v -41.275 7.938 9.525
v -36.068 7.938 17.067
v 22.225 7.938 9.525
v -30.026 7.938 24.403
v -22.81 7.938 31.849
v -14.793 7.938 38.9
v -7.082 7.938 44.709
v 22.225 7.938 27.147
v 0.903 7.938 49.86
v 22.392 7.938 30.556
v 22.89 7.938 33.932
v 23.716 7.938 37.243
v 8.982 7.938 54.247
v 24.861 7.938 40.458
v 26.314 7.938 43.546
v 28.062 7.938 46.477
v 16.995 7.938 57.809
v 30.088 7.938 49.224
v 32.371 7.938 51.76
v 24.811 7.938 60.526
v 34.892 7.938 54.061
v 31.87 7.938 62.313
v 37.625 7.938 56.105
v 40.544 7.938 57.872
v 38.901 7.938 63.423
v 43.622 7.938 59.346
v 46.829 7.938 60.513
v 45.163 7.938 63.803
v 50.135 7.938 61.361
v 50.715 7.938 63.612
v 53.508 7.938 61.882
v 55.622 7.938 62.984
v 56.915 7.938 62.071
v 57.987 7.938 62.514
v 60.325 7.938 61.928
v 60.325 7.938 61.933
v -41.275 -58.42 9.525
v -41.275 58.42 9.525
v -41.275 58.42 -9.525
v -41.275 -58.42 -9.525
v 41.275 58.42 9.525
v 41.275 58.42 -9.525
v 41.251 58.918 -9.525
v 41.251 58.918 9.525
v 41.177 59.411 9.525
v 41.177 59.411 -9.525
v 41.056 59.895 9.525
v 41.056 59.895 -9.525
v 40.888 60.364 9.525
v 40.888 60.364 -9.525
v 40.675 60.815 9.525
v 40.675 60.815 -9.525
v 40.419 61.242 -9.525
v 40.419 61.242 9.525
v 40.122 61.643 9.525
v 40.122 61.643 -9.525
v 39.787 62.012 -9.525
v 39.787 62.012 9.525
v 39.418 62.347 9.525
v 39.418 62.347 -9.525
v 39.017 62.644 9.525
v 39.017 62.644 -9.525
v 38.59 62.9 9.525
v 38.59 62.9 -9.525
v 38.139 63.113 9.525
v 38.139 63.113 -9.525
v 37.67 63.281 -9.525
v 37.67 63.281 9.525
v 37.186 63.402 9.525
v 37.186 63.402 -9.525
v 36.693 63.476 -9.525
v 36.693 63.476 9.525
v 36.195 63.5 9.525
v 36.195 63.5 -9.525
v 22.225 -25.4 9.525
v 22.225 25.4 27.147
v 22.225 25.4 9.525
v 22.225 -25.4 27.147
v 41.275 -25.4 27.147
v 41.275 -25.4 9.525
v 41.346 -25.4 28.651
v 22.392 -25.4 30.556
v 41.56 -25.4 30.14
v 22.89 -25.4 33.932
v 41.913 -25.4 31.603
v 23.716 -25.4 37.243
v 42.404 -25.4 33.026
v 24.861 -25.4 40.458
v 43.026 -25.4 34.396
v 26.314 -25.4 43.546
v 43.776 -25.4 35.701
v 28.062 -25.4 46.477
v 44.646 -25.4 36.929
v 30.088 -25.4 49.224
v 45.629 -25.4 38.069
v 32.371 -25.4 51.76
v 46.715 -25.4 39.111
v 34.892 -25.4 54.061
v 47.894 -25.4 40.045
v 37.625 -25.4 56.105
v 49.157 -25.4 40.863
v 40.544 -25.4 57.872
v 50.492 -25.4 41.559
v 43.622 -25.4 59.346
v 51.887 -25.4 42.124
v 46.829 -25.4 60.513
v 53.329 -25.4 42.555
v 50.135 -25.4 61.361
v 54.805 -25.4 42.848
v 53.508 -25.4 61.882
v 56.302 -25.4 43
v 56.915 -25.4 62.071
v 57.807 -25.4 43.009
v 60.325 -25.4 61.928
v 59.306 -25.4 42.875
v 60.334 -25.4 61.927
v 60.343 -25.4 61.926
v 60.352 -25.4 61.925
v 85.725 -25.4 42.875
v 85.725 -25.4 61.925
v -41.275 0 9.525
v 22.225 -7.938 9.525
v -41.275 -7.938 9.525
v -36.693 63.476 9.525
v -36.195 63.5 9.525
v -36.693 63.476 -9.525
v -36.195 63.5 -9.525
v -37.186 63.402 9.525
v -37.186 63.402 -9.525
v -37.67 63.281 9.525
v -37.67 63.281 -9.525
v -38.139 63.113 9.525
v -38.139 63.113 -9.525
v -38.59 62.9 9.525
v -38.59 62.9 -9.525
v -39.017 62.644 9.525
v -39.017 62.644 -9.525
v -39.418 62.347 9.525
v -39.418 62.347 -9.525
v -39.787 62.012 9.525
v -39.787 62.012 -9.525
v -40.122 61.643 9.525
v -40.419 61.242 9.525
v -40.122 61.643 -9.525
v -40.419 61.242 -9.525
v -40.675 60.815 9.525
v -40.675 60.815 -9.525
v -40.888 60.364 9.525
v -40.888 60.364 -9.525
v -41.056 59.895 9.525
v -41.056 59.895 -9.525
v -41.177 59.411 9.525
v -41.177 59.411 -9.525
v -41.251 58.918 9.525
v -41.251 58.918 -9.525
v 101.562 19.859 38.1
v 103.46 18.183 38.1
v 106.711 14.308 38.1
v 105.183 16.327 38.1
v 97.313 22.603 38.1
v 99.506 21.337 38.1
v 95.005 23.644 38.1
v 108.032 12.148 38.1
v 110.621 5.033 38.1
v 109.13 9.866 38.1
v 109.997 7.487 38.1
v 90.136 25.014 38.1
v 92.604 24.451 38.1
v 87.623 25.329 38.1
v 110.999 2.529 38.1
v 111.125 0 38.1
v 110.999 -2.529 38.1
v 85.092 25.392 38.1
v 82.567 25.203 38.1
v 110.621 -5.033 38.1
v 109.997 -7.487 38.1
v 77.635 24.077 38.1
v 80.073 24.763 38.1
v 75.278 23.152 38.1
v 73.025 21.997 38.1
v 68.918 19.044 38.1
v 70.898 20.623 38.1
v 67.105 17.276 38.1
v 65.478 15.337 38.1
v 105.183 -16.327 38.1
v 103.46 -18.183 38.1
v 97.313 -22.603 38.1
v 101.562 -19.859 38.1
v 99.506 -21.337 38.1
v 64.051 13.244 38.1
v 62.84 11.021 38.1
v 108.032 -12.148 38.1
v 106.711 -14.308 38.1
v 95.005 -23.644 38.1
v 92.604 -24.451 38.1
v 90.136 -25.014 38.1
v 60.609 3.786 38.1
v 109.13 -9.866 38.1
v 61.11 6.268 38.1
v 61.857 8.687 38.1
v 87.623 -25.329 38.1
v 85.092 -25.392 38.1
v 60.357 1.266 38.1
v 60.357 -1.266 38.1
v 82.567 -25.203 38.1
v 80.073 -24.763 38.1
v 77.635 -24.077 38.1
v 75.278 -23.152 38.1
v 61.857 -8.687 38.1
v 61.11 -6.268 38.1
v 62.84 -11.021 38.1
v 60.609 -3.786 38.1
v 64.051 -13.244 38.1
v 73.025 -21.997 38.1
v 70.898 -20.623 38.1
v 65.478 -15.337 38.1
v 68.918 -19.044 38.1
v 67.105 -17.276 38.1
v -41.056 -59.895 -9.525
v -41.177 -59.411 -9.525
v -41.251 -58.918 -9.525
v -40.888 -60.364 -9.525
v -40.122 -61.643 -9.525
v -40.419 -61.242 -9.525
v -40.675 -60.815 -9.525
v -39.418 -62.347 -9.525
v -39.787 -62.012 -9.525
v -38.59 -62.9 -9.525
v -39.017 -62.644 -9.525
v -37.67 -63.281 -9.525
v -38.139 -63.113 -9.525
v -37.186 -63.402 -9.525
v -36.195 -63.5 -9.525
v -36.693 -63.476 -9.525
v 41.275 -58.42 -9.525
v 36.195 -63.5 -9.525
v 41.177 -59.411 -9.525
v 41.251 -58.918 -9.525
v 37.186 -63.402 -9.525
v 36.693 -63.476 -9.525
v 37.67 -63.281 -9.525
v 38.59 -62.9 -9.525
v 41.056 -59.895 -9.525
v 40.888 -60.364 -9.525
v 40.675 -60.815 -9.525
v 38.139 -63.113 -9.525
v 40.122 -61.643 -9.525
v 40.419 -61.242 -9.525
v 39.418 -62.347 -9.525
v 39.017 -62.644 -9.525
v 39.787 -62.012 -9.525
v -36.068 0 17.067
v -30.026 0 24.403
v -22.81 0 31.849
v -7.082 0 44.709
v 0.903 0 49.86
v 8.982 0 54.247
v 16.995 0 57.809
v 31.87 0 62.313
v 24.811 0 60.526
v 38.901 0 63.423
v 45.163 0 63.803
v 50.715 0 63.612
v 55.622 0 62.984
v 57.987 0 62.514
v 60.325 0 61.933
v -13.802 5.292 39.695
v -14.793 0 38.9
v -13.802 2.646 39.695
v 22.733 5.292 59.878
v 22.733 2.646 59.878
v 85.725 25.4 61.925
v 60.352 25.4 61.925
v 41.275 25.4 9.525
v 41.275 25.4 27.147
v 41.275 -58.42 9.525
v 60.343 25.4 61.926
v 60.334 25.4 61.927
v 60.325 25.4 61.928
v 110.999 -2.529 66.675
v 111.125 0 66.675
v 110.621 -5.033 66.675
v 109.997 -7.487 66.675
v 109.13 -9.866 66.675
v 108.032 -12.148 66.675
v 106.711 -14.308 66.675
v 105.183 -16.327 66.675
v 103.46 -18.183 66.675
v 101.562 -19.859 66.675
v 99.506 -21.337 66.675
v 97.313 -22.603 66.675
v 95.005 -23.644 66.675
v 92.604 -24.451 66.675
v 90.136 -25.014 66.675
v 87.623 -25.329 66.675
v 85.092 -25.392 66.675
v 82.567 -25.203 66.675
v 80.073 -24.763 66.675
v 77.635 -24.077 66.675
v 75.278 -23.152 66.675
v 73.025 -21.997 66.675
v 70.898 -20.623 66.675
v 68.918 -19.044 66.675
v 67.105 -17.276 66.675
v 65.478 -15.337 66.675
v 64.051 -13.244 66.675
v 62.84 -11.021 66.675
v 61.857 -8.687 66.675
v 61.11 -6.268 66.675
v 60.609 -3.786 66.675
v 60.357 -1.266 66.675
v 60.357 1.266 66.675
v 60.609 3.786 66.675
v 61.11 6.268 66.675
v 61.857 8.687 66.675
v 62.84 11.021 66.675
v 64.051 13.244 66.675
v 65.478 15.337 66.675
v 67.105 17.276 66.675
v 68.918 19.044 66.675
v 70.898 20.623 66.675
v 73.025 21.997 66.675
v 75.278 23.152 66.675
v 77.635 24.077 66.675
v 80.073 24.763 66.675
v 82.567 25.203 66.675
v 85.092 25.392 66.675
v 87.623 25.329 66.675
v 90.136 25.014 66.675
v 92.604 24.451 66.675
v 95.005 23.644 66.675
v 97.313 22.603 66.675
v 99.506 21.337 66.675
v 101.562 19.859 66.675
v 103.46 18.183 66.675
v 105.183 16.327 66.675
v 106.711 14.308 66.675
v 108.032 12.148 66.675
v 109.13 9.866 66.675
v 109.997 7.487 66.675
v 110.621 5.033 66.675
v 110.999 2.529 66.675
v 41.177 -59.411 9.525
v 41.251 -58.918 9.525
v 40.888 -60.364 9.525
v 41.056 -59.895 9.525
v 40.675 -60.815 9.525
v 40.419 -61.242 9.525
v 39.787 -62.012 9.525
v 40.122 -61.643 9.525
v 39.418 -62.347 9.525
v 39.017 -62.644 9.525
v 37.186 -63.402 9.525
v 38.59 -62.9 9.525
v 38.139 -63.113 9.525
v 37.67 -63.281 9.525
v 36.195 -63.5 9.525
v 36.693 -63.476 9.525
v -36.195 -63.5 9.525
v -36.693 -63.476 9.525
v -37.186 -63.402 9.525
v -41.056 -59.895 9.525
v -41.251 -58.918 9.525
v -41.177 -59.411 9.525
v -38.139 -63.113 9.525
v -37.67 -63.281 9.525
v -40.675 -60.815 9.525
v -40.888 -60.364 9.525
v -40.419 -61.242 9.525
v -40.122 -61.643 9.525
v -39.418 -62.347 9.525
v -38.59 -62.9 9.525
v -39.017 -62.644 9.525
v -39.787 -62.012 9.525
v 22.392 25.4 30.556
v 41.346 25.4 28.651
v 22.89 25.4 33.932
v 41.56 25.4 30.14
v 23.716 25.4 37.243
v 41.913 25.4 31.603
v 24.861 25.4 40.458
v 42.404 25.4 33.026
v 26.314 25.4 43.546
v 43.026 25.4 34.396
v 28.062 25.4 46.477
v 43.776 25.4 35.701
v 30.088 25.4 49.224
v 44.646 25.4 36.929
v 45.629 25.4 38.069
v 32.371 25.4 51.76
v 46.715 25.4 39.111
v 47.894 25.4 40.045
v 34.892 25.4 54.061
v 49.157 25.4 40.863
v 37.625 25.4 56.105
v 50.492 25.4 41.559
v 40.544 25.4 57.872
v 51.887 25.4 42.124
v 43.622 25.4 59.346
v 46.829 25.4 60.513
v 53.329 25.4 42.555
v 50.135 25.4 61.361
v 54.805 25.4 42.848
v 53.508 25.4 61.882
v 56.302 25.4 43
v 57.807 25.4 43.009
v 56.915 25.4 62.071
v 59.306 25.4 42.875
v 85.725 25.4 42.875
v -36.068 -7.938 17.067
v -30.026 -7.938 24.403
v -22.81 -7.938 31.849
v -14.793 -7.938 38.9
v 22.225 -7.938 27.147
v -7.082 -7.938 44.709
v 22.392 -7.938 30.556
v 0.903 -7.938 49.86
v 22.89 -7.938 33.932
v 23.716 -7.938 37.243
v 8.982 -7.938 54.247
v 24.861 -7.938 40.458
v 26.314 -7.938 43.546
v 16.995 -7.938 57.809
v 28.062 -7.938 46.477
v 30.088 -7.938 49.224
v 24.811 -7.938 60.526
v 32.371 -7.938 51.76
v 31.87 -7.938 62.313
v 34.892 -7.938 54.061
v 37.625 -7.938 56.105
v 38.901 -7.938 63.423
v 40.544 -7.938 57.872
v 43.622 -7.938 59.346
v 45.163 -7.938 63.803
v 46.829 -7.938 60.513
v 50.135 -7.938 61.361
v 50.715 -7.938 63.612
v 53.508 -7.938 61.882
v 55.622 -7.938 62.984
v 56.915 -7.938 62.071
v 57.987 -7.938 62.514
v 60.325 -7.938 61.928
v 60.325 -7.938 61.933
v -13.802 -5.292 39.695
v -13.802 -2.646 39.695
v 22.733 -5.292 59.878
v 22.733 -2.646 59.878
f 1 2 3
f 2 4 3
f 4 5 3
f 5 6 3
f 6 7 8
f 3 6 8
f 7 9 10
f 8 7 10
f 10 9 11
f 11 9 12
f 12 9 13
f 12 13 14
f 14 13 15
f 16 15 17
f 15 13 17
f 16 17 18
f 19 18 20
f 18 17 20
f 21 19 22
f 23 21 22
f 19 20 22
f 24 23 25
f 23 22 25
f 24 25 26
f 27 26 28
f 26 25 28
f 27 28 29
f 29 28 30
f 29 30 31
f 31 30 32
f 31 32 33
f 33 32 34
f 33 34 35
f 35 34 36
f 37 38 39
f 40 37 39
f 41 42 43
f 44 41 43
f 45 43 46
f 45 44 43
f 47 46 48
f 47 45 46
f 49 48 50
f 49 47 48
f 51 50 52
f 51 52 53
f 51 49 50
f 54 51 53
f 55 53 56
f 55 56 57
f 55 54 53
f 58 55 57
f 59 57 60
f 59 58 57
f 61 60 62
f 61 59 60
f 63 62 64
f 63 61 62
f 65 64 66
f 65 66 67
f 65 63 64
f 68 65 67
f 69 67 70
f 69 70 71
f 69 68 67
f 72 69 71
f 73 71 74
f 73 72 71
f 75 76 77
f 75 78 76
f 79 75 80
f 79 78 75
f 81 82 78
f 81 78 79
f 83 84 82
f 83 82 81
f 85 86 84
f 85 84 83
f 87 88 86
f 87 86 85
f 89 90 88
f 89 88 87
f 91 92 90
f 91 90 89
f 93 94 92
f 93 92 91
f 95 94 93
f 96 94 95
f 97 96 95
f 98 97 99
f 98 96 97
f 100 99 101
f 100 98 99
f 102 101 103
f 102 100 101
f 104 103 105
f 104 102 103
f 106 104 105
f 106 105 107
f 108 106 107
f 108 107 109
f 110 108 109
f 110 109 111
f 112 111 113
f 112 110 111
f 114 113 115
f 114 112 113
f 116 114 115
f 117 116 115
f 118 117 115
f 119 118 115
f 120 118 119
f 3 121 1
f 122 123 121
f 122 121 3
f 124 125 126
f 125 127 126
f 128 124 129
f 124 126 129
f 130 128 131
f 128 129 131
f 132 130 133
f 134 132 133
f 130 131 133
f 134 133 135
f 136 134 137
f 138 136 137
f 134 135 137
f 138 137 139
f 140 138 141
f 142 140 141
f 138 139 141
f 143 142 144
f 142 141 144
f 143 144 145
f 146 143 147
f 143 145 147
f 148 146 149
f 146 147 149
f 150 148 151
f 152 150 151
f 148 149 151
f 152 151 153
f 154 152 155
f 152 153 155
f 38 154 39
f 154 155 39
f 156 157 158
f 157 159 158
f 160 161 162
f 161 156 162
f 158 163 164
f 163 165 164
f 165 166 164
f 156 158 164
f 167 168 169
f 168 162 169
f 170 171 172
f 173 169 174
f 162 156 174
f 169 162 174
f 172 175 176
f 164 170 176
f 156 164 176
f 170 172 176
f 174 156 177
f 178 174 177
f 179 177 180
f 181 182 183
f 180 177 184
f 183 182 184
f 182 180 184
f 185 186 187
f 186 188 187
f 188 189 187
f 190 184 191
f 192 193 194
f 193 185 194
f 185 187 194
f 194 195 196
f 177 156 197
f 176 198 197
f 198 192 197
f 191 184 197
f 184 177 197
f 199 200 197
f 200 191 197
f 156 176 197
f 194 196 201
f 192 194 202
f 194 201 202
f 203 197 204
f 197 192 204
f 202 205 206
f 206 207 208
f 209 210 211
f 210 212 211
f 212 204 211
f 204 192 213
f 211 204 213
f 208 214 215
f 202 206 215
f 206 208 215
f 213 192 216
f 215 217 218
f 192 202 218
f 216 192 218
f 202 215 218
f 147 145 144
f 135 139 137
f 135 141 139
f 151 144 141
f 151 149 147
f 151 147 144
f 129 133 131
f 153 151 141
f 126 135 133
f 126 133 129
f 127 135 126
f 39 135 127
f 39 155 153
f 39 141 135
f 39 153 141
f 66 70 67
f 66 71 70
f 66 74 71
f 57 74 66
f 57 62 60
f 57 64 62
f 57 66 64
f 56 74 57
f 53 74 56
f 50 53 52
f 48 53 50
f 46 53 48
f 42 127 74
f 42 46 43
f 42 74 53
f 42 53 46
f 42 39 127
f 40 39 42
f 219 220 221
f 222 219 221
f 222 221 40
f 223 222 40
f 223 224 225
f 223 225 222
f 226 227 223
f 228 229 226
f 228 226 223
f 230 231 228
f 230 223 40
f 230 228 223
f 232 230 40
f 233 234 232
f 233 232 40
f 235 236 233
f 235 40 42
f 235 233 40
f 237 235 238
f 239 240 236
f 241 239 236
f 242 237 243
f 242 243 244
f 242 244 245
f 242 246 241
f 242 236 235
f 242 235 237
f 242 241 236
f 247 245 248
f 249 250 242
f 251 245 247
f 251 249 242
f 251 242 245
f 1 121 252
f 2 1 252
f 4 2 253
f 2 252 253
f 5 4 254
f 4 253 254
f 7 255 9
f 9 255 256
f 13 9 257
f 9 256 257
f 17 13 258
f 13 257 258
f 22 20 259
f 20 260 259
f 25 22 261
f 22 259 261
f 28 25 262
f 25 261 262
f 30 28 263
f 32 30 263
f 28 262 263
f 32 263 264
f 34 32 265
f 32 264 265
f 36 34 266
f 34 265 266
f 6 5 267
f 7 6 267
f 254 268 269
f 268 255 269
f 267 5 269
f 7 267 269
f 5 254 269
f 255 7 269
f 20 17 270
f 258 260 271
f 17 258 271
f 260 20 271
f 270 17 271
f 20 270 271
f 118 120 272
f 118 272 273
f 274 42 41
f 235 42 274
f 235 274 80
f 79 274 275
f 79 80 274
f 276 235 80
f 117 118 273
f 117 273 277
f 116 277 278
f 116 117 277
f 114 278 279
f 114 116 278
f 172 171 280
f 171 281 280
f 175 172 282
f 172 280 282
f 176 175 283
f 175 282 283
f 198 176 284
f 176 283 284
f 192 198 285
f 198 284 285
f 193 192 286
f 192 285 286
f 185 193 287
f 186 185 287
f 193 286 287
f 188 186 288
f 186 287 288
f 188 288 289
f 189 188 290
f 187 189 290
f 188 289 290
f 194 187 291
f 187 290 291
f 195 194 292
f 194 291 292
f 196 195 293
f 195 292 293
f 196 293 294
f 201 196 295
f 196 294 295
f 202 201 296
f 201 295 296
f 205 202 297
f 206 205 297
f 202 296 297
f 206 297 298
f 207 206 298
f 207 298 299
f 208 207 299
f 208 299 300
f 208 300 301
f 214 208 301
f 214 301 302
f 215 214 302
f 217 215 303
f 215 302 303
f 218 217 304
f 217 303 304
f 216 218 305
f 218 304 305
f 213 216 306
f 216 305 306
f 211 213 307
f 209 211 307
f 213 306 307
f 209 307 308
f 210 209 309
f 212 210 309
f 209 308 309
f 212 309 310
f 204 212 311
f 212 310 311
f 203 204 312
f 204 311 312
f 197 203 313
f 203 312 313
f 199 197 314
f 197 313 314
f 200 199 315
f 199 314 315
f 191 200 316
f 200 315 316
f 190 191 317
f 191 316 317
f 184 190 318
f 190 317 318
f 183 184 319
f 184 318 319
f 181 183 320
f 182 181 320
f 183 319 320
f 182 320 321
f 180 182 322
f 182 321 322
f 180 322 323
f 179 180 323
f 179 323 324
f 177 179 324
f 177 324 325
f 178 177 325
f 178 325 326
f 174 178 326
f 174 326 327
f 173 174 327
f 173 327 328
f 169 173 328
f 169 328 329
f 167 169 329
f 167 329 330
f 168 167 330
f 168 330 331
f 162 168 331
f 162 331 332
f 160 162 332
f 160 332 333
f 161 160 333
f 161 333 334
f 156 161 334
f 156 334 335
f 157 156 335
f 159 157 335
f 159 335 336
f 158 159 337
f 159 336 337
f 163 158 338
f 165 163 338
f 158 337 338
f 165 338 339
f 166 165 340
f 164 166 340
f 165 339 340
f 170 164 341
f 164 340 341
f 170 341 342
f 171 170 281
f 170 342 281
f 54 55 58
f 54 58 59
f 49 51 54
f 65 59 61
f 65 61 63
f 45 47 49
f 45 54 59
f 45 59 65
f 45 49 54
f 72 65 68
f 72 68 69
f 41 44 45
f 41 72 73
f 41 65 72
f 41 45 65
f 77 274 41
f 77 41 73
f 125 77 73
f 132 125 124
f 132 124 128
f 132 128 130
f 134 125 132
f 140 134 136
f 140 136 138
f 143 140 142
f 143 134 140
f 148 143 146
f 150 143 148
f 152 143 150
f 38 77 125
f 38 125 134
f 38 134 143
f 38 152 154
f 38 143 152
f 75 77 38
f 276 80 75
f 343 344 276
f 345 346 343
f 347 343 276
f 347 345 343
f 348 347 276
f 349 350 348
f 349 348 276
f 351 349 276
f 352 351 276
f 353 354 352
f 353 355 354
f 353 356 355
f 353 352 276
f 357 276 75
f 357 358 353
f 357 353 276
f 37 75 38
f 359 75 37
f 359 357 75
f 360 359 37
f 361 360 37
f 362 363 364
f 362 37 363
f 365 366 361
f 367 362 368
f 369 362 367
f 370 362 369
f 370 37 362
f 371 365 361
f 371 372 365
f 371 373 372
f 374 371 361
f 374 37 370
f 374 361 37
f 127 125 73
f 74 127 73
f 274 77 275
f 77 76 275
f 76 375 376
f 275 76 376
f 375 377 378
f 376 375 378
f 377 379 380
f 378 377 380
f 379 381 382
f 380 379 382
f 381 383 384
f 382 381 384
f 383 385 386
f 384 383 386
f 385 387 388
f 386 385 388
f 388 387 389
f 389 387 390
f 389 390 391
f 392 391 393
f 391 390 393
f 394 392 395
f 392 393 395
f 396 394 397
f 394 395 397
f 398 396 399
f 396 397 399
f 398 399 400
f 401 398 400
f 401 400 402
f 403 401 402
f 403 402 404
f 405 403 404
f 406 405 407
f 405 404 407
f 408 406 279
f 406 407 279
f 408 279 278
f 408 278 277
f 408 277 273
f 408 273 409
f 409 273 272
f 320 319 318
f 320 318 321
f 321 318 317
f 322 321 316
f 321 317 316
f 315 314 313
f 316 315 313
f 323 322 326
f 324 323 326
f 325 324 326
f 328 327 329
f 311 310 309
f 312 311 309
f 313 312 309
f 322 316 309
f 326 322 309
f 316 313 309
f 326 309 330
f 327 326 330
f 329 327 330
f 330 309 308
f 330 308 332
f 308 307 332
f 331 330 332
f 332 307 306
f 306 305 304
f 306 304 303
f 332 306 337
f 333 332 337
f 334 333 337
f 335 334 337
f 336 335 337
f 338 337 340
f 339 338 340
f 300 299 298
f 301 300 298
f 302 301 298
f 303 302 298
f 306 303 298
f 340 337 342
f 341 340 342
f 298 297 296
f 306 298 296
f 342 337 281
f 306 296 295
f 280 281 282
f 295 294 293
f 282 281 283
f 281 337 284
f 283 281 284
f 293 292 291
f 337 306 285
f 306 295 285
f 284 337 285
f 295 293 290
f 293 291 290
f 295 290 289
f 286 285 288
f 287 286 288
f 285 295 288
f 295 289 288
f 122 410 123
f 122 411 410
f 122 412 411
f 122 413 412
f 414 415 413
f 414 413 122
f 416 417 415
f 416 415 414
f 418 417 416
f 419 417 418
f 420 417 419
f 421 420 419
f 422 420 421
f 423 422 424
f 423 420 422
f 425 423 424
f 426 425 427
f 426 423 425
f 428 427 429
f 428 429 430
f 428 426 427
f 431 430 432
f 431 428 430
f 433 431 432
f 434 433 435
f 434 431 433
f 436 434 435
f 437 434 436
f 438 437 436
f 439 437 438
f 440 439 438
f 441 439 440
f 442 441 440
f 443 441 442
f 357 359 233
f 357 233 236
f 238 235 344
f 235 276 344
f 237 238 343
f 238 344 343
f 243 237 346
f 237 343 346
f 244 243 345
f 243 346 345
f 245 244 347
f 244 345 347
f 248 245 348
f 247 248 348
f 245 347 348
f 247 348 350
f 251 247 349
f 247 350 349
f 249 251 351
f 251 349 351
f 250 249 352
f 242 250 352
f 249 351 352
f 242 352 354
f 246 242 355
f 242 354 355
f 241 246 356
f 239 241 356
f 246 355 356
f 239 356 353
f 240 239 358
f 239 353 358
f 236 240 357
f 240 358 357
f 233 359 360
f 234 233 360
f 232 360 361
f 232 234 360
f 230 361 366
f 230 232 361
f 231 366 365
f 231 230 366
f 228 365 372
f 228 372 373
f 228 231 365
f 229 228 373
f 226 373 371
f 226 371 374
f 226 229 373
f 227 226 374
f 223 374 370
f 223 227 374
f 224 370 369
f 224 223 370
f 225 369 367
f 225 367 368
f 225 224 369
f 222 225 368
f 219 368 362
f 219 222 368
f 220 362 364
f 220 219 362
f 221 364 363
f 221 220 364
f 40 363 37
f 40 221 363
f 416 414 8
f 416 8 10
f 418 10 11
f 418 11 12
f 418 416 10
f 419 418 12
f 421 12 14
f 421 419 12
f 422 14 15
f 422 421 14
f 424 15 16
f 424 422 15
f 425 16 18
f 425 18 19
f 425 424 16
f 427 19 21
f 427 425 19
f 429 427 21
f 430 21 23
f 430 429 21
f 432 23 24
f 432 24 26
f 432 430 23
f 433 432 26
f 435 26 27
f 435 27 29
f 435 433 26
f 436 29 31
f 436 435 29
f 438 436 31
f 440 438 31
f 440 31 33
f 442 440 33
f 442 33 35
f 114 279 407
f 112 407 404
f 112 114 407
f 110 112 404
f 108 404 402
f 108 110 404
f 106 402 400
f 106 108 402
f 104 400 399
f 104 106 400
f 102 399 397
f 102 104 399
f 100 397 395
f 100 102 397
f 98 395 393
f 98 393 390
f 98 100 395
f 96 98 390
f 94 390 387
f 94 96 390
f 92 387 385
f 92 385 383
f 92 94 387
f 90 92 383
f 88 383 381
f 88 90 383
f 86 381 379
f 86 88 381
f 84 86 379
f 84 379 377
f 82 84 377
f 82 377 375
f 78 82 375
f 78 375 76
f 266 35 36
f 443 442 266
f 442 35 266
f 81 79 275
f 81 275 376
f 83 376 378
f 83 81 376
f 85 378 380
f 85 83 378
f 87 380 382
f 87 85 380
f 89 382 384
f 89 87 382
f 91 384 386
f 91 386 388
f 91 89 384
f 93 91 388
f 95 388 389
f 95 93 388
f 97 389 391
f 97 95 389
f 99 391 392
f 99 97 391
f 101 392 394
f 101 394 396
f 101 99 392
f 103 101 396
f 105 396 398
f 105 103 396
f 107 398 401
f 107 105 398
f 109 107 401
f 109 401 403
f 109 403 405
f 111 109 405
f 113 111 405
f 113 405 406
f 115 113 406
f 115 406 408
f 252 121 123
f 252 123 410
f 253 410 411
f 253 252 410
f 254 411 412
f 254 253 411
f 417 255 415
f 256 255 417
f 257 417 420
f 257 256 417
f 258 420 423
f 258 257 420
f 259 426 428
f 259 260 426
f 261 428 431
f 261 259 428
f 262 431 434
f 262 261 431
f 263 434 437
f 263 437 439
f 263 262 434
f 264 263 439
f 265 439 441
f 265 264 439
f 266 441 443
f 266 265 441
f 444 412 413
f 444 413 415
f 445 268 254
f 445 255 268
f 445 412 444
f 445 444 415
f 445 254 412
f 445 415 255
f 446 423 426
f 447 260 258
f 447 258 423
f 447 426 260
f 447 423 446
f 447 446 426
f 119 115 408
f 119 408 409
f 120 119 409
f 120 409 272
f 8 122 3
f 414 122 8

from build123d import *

# Parameters (mm, degrees)
F1_DEPTH = 63.5
F2_DEPTH = 25.4
F3_DEPTH = 7.9375
F5_R     = 5.08


with BuildPart() as f1:
    # F0 (on Front) → F1 (new body, symmetric)
    with BuildSketch(Plane.XZ):
        Polygon((41.275, -9.525), (41.275, 9.525), (22.225, 9.525), (-41.275, 9.525), (-41.275, -9.525), align=None)
    extrude(amount=F1_DEPTH, both=True)

    # F0 (on Front) → F2 (join, symmetric)
    with BuildSketch(Plane.XZ):
        with BuildLine():
            Line((22.225, 9.525), (41.275, 9.525))
            Line((41.275, 9.525), (41.275, 27.147279))
            ThreePointArc((41.275, 27.147279), (46.714726, 39.110585), (59.305952, 42.8752))
            Line((59.305952, 42.8752), (60.325, 42.8752))
            Line((60.325, 42.8752), (60.325, 61.927662))
            ThreePointArc((60.325, 61.927662), (33.60357, 52.941101), (22.225, 27.147279))
            Line((22.225, 27.147279), (22.225, 9.525))
        make_face()
        with BuildLine():
            ThreePointArc((60.35185, 61.9252), (60.338425, 61.926433), (60.325, 61.927662))
            Line((60.325, 61.927662), (60.325, 42.8752))
            Line((60.325, 42.8752), (85.725, 42.8752))
            Line((85.725, 42.8752), (85.725, 61.9252))
            Line((85.725, 61.9252), (60.35185, 61.9252))
        make_face()
    extrude(amount=F2_DEPTH, both=True)

    # F5
    f5_edges = [f1.edges().sort_by_distance(p)[0] for p in [
        (41.275, 63.5, 0),
        (-41.275, 63.5, 0),
        (-41.275, -63.5, 0),
        (41.275, -63.5, 0),
    ]]
    fillet(f5_edges, radius=F5_R)


with BuildPart() as f3:
    # F0 (on Front) → F3 (new body, symmetric)
    with BuildSketch(Plane.XZ):
        with BuildLine():
            Line((-41.275, 9.525), (22.225, 9.525))
            Line((22.225, 9.525), (22.225, 27.147279))
            ThreePointArc((22.225, 27.147279), (33.60357, 52.941101), (60.325, 61.927662))
            Line((60.325, 61.927662), (60.325, 61.932572))
            add(Edge.make_bspline(
                [(-41.275, 9.525), (-21.002134, 41.976057), (24.873193, 71.655056), (60.325, 61.932572)],
                knots=[0, 0, 0, 0, 114.311848, 114.311848, 114.311848, 114.311848], degree=3))
        make_face()
    extrude(amount=F3_DEPTH, both=True)


with BuildPart() as f4:
    # F0 (on Front) → F4 (revolve)
    with BuildSketch(Plane.XZ):
        Polygon((85.725, 61.9252), (85.725, 42.8752), (85.725, 38.1), (111.125, 38.1), (111.125, 66.675), (85.725, 66.675), align=None)
    revolve(axis=Axis((85.725, 0, 52.3875), (0, 0, -1)))


solid = Compound([f1.part, f3.part, f4.part])
